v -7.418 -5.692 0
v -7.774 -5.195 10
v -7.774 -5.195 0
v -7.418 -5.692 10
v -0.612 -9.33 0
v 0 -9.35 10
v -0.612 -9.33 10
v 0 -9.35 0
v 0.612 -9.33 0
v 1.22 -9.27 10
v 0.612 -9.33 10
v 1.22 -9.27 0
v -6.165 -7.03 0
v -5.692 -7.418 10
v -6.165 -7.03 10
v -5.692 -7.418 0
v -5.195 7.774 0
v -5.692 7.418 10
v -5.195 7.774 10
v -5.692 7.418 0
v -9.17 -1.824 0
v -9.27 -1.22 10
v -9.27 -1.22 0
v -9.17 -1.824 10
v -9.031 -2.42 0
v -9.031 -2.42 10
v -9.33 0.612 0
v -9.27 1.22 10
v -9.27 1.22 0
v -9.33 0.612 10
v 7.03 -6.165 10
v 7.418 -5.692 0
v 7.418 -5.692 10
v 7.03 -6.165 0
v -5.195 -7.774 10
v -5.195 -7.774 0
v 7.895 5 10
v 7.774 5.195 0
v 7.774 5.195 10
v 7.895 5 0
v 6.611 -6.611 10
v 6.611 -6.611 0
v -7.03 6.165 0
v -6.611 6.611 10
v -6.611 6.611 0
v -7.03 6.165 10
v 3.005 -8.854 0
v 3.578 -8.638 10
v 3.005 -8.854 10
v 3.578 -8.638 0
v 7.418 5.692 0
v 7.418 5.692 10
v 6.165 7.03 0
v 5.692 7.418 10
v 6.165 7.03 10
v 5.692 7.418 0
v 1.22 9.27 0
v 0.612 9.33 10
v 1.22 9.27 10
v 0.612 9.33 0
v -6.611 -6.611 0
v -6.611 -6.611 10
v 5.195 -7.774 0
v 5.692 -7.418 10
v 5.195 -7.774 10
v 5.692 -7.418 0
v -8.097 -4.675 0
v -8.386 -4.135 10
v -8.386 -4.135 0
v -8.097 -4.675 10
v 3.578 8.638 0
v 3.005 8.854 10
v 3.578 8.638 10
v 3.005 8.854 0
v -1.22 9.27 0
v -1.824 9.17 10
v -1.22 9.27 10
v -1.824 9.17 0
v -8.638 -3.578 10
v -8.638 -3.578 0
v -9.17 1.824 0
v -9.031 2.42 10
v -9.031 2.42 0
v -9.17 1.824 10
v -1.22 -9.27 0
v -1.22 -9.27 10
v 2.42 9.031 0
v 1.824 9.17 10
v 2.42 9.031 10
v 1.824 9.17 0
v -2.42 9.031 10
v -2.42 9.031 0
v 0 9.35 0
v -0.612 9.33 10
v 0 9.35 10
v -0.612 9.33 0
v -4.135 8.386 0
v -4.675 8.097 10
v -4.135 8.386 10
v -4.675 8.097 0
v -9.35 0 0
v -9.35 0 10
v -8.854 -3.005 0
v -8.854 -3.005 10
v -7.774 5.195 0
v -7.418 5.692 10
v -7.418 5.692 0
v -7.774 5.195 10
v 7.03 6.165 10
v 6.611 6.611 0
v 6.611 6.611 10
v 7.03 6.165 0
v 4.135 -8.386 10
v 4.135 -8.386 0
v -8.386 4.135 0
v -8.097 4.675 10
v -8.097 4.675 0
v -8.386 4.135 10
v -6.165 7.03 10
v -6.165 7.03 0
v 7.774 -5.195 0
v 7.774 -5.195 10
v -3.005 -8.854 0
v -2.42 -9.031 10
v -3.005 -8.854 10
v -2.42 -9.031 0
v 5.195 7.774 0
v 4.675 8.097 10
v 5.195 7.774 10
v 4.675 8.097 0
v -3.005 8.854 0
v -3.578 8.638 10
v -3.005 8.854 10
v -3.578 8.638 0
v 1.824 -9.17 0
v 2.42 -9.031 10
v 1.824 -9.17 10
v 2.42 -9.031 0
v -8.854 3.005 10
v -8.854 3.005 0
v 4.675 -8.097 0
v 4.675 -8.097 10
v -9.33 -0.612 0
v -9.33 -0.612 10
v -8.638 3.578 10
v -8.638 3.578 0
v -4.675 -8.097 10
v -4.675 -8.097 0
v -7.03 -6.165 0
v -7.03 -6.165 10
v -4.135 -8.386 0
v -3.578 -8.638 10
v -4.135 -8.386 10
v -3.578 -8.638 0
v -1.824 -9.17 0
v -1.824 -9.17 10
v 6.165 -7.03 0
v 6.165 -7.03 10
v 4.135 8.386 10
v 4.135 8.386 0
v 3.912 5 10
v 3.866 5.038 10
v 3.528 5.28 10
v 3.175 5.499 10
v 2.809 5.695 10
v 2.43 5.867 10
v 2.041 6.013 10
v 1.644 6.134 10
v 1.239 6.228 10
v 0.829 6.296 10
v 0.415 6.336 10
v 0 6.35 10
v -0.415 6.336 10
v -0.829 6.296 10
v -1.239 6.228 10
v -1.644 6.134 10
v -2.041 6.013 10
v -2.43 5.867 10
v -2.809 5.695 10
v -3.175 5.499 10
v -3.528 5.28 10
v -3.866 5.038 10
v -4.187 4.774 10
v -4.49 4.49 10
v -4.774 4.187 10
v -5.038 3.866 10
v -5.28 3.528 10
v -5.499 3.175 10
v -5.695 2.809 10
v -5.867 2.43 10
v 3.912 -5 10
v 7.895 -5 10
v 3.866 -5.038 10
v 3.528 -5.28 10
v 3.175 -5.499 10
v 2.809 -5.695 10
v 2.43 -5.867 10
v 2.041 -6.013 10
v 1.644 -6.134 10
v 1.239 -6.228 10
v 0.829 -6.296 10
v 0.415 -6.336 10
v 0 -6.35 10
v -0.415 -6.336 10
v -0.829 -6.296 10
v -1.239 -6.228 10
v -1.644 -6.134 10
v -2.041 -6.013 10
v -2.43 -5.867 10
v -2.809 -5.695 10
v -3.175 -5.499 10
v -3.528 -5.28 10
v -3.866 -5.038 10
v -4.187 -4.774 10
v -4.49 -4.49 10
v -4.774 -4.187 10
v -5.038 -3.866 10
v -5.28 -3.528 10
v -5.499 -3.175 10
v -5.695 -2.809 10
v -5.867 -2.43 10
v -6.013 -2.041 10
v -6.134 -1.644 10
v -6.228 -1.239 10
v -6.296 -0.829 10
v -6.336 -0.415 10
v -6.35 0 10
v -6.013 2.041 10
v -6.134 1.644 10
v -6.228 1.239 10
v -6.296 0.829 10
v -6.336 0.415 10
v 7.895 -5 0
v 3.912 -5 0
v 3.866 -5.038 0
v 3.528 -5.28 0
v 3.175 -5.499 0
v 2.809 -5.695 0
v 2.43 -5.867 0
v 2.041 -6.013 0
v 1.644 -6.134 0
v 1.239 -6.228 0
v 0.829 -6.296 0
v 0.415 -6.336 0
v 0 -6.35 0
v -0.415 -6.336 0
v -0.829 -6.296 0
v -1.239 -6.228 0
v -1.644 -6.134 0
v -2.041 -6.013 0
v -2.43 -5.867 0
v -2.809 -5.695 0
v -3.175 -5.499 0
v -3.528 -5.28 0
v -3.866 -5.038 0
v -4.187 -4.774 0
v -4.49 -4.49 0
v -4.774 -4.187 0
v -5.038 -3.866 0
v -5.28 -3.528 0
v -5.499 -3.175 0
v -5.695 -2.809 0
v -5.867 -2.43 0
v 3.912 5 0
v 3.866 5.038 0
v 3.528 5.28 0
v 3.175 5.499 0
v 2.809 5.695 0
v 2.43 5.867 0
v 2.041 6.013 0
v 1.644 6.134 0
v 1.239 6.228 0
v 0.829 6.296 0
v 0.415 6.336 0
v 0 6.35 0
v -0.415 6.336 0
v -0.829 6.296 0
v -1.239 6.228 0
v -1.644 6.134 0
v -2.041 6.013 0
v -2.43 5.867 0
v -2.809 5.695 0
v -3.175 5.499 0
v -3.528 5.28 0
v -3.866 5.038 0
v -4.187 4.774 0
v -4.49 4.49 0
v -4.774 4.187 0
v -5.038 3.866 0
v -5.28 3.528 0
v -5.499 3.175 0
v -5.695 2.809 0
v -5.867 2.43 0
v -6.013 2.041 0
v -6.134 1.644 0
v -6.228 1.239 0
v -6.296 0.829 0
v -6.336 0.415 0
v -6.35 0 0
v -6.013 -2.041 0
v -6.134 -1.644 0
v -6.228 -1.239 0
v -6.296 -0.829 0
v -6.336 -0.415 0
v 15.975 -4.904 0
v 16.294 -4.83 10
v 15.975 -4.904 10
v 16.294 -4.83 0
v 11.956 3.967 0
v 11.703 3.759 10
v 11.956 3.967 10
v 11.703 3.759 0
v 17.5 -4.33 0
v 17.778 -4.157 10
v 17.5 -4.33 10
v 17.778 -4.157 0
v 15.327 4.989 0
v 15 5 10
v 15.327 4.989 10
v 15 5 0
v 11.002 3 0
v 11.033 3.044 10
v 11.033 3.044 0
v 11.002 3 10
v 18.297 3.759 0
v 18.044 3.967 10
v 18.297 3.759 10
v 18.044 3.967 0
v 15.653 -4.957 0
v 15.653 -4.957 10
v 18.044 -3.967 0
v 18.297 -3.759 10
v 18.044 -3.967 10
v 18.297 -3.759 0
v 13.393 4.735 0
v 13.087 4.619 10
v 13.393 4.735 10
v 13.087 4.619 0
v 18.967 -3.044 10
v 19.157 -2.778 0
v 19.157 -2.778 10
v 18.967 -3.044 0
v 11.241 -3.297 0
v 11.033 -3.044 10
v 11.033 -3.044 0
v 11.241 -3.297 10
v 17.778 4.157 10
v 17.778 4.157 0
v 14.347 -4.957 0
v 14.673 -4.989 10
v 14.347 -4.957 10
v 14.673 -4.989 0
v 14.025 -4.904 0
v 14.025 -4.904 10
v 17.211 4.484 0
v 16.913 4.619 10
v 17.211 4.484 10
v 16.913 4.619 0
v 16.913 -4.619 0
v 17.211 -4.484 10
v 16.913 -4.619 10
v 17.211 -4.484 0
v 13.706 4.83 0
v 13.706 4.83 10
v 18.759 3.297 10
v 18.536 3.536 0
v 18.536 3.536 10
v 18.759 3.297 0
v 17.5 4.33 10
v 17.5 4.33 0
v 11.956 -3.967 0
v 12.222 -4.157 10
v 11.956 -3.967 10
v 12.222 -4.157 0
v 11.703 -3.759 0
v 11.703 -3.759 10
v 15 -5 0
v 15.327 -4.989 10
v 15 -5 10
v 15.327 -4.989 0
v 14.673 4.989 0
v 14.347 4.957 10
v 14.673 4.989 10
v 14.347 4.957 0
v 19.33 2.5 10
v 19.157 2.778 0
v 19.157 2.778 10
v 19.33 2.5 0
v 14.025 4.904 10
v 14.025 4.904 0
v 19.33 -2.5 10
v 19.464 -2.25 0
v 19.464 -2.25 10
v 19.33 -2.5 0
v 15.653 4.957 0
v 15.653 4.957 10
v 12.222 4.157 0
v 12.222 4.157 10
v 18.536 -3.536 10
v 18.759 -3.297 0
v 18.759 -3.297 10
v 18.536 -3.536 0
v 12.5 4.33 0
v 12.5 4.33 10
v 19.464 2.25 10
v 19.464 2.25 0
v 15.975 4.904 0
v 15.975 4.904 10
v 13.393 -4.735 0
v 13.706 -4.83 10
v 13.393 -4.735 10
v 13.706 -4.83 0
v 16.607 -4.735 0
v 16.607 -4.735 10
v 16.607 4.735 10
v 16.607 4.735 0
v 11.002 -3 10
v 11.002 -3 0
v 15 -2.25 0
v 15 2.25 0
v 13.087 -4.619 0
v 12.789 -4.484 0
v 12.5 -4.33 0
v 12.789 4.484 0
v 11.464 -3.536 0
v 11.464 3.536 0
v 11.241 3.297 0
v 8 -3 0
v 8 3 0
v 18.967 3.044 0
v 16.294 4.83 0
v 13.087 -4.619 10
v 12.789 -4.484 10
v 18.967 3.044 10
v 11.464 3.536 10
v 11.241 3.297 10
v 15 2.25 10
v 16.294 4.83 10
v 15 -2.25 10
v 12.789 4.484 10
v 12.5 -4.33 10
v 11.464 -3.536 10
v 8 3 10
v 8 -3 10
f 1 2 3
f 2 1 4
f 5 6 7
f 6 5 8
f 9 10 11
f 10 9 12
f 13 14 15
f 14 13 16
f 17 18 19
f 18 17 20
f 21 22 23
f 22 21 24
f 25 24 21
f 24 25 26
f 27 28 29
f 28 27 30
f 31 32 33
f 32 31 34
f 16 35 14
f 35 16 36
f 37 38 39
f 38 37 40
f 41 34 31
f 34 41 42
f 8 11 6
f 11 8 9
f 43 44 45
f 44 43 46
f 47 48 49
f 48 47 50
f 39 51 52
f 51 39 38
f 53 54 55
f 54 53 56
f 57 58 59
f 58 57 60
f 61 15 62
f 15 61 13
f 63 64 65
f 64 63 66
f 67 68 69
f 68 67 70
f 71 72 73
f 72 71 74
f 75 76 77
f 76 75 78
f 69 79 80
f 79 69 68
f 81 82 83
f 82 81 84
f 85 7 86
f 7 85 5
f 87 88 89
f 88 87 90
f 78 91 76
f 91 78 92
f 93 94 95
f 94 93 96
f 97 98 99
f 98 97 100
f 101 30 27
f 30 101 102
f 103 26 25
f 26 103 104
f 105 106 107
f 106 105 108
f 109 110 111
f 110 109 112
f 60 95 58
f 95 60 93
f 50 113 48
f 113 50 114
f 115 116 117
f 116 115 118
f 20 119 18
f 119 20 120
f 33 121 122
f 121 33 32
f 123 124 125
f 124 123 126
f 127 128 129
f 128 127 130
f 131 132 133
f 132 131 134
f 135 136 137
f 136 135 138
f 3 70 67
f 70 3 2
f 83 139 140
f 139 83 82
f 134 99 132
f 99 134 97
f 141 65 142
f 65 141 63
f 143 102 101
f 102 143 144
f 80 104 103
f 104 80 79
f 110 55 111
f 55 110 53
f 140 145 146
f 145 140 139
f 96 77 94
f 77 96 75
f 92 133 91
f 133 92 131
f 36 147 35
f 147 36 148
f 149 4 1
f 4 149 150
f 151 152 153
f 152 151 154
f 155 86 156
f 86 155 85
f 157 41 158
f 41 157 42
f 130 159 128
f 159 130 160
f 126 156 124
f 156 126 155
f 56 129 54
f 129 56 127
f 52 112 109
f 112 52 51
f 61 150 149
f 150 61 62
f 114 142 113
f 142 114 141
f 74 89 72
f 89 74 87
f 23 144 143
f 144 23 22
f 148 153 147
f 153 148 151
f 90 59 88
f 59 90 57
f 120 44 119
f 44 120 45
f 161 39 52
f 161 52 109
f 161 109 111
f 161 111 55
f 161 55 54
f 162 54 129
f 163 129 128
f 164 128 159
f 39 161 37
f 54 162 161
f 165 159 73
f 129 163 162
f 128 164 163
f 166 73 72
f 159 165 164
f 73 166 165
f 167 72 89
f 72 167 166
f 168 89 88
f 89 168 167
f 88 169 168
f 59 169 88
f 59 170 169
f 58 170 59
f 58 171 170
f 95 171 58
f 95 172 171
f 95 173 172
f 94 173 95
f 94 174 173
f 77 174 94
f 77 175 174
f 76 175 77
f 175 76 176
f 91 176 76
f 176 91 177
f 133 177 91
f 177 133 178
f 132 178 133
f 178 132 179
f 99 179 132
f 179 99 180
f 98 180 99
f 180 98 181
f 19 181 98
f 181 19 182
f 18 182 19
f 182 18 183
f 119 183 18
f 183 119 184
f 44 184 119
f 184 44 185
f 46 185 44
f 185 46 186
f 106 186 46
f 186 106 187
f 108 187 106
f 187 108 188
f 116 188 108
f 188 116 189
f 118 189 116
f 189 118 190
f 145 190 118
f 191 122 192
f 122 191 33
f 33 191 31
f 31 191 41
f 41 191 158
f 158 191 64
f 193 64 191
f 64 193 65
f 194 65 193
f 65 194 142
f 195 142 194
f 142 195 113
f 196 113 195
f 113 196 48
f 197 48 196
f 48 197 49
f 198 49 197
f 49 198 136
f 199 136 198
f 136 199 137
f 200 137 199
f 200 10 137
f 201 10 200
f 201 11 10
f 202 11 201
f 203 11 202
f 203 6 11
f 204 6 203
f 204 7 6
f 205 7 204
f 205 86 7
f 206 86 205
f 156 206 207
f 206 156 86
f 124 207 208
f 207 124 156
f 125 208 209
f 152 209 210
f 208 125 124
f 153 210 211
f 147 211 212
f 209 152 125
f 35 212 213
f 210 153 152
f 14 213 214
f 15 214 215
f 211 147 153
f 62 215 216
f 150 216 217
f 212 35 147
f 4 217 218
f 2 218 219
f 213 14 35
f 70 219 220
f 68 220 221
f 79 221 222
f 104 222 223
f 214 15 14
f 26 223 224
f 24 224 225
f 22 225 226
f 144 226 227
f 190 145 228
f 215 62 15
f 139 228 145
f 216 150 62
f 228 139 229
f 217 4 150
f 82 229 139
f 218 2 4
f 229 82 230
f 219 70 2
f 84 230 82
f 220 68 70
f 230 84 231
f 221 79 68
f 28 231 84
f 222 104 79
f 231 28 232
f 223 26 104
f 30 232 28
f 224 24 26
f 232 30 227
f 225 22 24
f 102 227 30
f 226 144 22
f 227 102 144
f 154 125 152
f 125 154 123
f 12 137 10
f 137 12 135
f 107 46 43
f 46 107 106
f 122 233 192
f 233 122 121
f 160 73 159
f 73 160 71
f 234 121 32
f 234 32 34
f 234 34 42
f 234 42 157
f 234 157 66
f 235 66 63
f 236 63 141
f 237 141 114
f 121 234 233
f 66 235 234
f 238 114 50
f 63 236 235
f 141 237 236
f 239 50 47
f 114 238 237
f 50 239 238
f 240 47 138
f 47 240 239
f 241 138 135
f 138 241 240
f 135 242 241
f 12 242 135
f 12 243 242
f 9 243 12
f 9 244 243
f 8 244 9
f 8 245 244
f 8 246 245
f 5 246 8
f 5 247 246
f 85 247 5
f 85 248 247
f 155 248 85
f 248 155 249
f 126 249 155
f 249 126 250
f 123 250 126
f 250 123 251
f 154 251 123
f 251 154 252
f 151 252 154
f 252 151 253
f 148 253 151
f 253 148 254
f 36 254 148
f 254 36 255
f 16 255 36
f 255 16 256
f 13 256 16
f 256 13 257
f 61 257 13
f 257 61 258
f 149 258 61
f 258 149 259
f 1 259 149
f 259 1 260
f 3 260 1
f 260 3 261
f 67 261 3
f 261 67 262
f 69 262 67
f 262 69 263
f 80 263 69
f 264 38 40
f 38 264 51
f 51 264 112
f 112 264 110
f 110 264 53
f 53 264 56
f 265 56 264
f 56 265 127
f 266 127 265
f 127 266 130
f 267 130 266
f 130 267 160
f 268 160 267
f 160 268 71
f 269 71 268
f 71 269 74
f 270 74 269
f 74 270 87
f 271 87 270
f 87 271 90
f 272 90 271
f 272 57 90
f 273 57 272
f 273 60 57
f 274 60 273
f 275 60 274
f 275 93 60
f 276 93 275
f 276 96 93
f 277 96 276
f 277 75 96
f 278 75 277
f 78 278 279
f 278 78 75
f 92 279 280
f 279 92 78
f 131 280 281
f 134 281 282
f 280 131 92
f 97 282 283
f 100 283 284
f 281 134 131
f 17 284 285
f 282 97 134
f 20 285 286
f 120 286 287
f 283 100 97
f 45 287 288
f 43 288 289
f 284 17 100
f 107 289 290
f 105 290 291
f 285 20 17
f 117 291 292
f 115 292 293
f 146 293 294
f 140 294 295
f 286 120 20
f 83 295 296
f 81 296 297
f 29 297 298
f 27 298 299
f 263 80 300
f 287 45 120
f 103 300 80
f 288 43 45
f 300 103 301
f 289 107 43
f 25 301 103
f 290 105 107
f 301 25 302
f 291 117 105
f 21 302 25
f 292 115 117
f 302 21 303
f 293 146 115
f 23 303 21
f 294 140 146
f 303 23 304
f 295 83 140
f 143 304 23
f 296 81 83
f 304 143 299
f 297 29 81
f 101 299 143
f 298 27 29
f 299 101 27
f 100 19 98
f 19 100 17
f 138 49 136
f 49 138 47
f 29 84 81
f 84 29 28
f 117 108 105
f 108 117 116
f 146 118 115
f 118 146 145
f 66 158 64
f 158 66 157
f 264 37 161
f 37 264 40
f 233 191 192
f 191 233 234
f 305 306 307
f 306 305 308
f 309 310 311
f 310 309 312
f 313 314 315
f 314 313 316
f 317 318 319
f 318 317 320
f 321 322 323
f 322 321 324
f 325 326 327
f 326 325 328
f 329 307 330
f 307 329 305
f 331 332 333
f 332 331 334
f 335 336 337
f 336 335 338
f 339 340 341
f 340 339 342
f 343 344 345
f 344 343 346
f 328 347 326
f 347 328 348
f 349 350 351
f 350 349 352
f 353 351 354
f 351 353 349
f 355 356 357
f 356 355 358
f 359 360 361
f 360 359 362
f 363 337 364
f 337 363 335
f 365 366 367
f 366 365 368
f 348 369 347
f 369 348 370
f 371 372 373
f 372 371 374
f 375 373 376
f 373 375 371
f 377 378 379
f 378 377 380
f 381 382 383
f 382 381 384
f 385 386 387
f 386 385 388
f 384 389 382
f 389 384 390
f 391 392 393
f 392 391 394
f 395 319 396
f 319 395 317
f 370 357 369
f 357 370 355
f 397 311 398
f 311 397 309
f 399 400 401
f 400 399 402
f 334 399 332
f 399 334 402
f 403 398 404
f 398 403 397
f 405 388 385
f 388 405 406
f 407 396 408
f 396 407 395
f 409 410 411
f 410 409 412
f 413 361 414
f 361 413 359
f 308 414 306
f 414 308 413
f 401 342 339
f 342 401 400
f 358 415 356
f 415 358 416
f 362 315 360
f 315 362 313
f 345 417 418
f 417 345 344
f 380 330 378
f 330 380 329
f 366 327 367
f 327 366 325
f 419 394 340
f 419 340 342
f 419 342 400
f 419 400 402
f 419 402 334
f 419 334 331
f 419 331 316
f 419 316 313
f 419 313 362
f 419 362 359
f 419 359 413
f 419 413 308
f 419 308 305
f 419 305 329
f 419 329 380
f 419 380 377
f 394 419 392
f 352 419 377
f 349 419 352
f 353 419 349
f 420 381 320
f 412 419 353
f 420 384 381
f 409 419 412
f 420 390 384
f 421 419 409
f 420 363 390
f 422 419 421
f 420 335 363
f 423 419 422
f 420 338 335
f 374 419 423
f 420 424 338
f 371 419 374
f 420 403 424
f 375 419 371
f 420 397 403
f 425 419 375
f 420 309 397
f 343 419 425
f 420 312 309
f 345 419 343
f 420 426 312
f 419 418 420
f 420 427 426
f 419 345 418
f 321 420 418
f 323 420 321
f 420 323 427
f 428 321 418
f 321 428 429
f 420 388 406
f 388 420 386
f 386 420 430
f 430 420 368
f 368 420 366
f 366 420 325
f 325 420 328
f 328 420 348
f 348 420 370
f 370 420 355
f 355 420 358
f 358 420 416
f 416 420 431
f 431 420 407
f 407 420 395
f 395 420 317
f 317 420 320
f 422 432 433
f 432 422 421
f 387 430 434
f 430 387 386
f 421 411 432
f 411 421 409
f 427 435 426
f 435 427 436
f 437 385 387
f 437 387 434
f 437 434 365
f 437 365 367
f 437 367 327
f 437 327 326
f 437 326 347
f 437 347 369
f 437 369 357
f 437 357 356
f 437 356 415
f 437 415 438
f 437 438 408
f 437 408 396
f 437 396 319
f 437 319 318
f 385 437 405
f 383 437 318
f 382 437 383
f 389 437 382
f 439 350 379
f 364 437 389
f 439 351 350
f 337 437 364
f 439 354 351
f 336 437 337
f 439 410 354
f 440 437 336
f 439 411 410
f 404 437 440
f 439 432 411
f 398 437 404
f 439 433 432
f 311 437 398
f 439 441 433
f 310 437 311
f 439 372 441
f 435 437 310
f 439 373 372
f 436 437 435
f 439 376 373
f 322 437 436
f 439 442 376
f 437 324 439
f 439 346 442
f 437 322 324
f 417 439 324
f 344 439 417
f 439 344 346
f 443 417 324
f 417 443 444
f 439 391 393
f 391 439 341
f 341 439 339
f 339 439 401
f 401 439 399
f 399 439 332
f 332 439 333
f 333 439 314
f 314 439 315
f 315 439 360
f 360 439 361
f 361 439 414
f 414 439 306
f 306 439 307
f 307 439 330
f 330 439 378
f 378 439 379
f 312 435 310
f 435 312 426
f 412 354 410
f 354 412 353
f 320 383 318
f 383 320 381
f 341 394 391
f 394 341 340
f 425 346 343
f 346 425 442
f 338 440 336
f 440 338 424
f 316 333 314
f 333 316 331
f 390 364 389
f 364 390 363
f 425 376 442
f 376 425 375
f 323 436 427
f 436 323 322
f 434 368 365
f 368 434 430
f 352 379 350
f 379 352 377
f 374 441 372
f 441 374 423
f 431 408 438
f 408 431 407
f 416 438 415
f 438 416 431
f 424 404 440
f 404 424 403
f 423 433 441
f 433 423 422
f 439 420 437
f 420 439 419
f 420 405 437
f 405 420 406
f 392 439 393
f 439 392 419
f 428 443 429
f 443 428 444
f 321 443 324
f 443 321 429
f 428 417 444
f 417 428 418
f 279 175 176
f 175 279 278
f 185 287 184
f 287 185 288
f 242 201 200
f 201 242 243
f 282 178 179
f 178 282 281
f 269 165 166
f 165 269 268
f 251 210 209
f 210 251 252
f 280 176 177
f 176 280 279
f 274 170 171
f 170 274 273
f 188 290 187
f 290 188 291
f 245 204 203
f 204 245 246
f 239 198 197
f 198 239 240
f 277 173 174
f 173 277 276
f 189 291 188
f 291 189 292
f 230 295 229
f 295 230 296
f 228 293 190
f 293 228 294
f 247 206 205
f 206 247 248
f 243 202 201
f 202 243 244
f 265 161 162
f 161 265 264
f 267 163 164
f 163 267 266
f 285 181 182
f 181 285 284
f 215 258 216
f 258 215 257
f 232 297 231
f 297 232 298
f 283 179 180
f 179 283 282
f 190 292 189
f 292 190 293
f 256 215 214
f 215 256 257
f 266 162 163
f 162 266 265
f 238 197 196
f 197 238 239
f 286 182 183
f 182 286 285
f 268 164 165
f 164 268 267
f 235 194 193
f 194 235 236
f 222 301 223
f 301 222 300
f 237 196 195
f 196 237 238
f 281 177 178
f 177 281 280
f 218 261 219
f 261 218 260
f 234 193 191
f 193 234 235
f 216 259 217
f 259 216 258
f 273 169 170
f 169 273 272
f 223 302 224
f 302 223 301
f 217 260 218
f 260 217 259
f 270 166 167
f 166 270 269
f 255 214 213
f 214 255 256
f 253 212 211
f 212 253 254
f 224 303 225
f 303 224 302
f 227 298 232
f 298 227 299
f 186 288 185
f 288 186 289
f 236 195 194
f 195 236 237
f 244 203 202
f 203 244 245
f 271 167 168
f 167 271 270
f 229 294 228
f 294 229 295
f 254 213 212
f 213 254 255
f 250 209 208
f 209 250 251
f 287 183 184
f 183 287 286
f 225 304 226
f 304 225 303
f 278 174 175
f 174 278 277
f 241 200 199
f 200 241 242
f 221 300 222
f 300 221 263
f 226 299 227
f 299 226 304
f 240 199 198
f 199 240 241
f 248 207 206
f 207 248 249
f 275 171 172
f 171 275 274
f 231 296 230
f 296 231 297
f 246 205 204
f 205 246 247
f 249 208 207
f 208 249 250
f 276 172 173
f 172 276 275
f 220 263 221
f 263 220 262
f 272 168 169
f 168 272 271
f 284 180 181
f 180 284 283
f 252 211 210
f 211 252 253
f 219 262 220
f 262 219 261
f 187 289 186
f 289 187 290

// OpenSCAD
// Snap-on tubing clip for 12.7 mm lab stand rod
// Print orientation: flat on bed, extruded upward in +Z

$fn = 96;

// ---- Rod ring ----
rod_d      = 12.7;   // rod diameter (inner)
ring_w     = 3;      // ring wall thickness
ring_od    = rod_d + 2*ring_w; // outer diameter = 18.7
ring_h     = 10;     // extrusion height
ring_open  = 10;     // opening width on -X side

// ---- Tubing ring ----
tub_d      = 6;      // tubing inner diameter
tub_w      = 2;      // tubing wall thickness
tub_od     = tub_d + 2*tub_w; // outer diameter = 10
tub_x      = 15;     // ring centre X position
tub_h      = 10;     // extrusion height
tub_open   = 4.5;    // opening width on +X side

// ---- Bridge ----
bridge_x1  = 8;      // bridge start X
bridge_x2  = 12;     // bridge end X
bridge_w   = 6;      // bridge width in Y

// ---- Misc ----
eps        = 0.5;    // cutter overshoot past faces

difference() {
    union() {
        // Rod ring
        difference() {
            cylinder(d = ring_od, h = ring_h);
            translate([0, -ring_open/2, -eps])
                cube([ring_open + eps, ring_open, ring_h + 2*eps]);
        }
        // Tubing ring
        translate([tub_x, 0, 0])
            difference() {
                cylinder(d = tub_od, h = tub_h);
                translate([0, -tub_open/2, -eps])
                    cube([tub_open + eps, tub_open, tub_h + 2*eps]);
            }
        // Bridge
        translate([bridge_x1, -bridge_w/2, 0])
            cube([bridge_x2 - bridge_x1, bridge_w, ring_h]);
    }
    // Rod inner hole, running through the full height
    translate([0, 0, -eps])
        cylinder(d = rod_d, h = ring_h + 2*eps);
}
